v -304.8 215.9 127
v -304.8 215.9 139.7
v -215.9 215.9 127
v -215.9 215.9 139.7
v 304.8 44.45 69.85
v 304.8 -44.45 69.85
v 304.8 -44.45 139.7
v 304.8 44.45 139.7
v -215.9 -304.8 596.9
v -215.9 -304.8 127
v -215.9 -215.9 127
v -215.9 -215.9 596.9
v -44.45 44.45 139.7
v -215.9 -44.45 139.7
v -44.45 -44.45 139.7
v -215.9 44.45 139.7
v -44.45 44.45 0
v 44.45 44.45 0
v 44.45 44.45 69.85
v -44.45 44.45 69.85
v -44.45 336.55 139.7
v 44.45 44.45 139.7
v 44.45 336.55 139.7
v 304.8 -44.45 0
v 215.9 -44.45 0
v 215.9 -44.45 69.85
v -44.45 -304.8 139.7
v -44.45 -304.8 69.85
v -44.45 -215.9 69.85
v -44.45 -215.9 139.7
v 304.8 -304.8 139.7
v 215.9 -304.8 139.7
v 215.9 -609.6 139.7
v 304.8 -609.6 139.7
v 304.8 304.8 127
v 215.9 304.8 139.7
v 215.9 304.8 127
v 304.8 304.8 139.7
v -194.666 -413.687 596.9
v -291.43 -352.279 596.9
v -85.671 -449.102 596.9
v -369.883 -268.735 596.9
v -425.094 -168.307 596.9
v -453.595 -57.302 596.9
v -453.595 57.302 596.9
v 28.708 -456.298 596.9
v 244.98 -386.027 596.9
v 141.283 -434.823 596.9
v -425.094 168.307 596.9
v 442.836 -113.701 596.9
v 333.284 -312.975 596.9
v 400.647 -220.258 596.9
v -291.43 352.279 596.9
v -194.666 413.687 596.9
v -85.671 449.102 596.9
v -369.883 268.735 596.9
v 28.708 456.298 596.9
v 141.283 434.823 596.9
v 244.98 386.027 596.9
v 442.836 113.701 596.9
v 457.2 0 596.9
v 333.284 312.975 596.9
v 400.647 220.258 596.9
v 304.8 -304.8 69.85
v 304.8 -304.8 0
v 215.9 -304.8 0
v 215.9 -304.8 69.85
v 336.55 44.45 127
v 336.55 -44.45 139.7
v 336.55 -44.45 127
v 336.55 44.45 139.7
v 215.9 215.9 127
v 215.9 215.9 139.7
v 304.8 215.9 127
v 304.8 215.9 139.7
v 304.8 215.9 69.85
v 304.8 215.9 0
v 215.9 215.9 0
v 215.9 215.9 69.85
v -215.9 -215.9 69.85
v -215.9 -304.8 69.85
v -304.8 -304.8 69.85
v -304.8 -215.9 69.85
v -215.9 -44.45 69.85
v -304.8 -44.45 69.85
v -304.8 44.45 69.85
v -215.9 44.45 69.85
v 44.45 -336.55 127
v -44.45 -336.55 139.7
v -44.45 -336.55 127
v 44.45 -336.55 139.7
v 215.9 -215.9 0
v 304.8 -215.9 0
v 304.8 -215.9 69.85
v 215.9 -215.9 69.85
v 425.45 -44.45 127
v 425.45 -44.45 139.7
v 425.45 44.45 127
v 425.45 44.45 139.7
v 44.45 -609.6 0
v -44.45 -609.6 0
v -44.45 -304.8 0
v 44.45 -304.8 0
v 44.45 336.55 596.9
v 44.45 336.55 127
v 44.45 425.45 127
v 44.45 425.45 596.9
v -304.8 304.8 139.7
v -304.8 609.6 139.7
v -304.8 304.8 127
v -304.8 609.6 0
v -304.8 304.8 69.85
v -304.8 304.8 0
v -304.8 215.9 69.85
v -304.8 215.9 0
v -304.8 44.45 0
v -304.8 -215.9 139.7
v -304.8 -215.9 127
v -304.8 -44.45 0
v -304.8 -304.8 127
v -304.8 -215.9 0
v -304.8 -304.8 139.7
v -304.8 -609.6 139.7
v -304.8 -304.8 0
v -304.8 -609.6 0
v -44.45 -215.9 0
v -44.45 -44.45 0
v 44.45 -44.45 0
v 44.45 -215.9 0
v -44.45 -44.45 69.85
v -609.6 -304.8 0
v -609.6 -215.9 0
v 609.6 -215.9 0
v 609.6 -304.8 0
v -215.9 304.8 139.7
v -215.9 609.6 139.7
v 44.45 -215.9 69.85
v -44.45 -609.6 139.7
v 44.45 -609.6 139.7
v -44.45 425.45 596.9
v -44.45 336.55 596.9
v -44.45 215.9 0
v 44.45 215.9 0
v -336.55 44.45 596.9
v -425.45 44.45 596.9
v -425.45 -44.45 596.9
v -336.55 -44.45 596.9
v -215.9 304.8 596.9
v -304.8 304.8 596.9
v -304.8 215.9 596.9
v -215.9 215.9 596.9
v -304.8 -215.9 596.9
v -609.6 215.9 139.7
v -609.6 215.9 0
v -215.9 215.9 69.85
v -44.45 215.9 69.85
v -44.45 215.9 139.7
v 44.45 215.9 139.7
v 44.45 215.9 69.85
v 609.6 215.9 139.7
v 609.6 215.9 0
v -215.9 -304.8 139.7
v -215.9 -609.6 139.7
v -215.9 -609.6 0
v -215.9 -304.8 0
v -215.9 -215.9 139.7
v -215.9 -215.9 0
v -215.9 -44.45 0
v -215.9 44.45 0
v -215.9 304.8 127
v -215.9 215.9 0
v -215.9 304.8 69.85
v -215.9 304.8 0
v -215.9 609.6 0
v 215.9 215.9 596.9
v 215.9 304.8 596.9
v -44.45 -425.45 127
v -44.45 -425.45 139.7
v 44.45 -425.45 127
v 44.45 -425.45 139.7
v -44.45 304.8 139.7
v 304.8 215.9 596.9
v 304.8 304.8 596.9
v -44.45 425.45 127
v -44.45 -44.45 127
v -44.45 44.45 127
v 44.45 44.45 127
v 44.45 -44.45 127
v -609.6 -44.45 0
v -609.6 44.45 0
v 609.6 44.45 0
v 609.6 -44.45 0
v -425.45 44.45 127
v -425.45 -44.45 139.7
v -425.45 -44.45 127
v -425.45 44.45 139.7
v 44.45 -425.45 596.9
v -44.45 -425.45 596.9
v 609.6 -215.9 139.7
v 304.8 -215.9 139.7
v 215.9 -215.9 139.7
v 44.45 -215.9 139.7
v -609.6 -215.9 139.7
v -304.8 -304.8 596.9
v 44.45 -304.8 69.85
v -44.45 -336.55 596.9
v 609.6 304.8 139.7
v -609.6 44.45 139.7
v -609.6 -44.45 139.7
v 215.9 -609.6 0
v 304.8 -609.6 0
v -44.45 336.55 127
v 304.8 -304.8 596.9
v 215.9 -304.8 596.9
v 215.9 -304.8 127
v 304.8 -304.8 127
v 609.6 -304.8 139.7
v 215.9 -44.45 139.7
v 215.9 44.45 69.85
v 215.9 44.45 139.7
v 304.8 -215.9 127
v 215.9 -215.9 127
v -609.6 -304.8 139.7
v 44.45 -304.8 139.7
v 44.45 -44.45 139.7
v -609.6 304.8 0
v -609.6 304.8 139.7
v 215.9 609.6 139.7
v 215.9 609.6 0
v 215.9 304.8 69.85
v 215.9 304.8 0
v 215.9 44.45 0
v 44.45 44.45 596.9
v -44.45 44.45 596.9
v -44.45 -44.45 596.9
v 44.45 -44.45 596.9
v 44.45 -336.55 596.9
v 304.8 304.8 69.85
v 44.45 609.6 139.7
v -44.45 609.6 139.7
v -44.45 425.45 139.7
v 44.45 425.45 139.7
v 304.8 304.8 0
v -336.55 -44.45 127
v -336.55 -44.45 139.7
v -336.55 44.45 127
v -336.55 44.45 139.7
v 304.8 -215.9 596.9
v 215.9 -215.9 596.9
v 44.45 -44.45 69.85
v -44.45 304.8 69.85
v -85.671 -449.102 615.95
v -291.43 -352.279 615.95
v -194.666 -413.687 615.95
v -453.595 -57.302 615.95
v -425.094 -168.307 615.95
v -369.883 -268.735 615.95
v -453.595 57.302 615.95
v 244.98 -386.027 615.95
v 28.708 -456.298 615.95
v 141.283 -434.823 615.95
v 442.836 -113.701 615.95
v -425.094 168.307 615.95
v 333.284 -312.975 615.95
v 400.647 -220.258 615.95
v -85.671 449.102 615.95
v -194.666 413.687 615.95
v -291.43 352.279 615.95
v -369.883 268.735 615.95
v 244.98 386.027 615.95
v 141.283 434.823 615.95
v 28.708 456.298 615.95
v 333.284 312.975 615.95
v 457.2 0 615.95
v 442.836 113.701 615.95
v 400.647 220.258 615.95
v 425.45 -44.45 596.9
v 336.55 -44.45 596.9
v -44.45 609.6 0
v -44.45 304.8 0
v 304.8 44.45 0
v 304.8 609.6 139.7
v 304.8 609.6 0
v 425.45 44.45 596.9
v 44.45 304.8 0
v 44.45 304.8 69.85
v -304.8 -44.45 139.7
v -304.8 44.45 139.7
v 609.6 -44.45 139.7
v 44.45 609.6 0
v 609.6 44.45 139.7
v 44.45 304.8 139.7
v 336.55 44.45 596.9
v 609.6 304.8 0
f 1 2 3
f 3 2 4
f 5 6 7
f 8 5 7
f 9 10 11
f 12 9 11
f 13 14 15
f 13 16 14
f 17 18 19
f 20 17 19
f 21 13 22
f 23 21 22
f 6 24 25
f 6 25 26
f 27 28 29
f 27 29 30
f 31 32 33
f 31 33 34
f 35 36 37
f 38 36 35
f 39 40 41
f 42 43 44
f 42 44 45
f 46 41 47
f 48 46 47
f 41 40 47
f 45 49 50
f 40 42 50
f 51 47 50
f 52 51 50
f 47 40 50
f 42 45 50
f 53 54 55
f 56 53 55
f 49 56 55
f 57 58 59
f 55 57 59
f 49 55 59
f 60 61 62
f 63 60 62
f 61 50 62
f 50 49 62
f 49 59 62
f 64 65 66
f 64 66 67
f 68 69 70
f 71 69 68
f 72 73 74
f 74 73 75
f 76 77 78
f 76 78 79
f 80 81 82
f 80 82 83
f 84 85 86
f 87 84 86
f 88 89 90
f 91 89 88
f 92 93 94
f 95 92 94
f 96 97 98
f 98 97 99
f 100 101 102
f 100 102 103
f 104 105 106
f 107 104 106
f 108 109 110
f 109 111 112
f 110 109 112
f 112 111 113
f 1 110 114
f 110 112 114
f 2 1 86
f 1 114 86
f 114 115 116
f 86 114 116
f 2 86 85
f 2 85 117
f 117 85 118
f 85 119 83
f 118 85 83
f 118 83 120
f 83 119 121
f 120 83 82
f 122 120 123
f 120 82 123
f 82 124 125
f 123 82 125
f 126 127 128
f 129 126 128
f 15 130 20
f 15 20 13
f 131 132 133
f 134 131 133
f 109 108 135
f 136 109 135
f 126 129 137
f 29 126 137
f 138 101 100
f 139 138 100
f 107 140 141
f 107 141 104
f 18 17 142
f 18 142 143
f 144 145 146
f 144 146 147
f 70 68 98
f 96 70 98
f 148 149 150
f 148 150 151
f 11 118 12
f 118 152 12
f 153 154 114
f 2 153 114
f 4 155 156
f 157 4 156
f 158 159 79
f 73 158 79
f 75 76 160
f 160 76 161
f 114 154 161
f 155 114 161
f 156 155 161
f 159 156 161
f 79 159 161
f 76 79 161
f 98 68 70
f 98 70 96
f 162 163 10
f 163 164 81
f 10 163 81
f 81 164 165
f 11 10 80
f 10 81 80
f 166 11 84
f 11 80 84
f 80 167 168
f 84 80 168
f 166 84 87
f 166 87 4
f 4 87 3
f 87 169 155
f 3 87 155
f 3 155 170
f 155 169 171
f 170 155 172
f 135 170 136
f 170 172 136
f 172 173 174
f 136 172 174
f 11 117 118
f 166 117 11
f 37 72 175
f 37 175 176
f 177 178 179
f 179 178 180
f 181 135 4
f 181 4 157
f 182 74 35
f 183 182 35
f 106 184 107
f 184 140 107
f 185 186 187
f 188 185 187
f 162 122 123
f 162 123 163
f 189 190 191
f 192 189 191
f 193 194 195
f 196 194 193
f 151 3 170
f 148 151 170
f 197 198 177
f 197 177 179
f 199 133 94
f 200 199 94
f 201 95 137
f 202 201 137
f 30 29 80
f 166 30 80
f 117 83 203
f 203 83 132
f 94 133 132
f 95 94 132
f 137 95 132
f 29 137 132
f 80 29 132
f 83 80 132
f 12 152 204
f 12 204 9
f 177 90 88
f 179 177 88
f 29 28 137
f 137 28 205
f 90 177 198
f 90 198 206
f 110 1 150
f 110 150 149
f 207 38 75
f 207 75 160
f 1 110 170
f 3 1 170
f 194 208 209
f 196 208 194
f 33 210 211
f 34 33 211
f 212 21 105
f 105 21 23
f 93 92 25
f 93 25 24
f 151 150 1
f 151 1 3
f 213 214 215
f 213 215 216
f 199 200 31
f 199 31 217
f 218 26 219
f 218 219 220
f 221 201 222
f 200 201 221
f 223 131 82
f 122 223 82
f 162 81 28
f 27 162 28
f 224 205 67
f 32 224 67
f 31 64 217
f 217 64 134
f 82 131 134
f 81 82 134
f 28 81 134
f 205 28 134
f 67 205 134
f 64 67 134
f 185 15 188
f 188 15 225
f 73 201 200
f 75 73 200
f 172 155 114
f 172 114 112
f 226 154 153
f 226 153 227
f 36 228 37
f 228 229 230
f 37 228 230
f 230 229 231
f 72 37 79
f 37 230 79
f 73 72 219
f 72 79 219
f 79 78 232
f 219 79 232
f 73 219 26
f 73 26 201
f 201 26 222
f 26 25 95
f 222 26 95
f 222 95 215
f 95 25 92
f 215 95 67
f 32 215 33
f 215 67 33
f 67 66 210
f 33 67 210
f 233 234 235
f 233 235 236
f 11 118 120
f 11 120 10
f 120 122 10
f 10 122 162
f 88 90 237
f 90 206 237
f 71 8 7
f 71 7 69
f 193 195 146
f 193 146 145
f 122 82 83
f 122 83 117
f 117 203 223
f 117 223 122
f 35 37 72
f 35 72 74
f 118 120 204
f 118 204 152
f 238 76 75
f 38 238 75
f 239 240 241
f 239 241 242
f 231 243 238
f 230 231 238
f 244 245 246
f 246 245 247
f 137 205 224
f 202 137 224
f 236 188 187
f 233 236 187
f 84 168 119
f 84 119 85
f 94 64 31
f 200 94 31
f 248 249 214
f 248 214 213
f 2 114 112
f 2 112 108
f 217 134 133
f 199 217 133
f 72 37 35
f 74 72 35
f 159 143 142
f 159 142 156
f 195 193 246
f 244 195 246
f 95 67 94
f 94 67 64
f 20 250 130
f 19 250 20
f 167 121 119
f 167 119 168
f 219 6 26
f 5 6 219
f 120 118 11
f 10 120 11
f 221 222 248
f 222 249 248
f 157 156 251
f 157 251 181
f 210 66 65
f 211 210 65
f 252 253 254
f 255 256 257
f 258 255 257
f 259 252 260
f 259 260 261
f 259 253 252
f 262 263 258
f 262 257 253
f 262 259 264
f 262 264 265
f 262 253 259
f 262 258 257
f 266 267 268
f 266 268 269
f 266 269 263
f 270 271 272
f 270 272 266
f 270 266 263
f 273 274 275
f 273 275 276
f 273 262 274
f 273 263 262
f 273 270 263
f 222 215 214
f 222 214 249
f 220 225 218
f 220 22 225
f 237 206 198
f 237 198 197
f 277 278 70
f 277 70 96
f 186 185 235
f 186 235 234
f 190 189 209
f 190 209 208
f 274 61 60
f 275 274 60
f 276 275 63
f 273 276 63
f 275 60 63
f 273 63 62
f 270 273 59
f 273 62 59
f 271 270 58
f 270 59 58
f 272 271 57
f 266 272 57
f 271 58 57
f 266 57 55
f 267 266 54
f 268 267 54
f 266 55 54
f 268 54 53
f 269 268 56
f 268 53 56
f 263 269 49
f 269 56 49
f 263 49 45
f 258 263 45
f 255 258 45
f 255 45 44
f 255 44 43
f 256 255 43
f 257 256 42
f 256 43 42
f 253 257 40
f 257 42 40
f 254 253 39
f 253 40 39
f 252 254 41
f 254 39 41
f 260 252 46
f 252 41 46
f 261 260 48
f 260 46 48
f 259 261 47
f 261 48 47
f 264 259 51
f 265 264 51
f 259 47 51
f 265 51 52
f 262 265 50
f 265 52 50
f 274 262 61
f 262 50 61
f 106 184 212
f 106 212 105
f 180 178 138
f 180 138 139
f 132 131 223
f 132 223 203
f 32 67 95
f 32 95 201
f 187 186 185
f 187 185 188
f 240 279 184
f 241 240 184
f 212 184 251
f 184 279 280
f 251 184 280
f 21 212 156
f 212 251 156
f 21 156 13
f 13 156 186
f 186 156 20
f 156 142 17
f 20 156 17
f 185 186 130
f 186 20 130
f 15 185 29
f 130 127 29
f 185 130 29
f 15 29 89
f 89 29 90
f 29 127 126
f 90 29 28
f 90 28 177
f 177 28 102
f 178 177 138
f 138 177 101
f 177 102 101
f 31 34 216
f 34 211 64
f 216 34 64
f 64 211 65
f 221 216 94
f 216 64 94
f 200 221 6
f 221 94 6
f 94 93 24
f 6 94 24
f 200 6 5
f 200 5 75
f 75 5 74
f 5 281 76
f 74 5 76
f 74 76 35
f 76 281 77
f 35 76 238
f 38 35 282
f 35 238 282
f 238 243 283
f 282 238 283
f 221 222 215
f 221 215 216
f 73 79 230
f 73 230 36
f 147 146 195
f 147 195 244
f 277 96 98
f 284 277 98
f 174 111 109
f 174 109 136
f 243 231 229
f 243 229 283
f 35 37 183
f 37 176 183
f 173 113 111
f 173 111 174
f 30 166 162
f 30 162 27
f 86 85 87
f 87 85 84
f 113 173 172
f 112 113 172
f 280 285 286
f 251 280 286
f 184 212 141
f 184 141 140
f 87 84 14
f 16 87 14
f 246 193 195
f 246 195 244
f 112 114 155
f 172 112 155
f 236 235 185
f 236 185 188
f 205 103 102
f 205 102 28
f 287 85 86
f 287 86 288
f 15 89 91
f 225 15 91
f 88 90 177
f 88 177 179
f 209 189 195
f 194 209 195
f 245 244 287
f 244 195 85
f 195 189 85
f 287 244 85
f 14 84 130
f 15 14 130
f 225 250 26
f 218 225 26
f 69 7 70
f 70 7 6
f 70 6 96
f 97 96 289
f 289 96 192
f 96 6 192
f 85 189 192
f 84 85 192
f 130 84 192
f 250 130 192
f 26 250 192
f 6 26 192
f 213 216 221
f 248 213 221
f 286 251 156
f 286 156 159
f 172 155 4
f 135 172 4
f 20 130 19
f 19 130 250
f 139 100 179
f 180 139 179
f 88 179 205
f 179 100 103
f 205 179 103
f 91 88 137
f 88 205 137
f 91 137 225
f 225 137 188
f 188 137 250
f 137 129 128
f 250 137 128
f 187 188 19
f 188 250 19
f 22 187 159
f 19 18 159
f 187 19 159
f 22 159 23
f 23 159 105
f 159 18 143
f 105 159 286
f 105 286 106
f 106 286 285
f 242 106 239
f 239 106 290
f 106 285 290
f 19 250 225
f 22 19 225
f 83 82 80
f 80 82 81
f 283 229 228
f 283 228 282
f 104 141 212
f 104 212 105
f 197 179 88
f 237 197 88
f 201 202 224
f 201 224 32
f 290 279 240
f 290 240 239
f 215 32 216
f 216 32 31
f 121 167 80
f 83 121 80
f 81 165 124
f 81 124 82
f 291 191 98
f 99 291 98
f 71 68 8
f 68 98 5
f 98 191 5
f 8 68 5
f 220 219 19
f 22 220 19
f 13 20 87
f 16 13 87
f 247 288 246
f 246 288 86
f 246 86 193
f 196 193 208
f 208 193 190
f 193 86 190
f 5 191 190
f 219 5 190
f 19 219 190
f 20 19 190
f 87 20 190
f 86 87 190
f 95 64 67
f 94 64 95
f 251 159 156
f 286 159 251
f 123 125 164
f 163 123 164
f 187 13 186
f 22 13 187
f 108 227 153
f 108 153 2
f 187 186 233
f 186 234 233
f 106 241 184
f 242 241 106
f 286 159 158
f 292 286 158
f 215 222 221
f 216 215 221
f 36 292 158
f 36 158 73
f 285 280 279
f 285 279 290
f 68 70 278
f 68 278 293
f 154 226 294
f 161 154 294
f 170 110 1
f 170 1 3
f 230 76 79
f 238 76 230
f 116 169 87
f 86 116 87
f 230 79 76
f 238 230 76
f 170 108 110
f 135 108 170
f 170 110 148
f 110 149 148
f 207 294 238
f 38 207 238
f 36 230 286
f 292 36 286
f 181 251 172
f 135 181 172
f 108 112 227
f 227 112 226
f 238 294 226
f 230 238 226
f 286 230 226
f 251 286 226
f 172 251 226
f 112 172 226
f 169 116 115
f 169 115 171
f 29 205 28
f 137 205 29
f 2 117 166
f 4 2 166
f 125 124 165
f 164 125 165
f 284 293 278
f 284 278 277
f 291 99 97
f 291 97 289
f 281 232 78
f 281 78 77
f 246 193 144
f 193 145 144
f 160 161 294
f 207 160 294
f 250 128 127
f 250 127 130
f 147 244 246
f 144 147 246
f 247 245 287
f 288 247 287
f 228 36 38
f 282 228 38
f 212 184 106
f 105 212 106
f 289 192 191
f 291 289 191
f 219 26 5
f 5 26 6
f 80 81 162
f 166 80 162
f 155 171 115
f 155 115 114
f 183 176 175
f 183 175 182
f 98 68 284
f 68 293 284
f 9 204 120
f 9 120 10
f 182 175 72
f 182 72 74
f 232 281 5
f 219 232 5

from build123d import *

# Parameters (mm, degrees)
F0_W          = 88.9
F0_H          = 304.8
F0_H_2        = 88.9
F0_H_3        = 171.45
F1_DEPTH      = 139.7
F0_W_2        = 304.8
F0_W_3        = 171.45
F2_DEPTH      = 139.7
F3_W          = 88.9
F3_H          = 69.85
F4_DEPTH      = 914.401
F5_W          = 88.9
F5_H          = 69.85
F6_DEPTH      = 914.401
F7_W          = 88.9
F7_H          = 88.9
F8_DEPTH      = 457.2
F8_DEPTH_BACK = 12.7
F10_R         = 457.2
F10_W         = 88.9
F10_H         = 88.9
F11_DEPTH     = 19.05


# Not quite as in the source:
# - a feature names something its author has since deleted; it is built from what else it names


with BuildPart() as f1:
    # F0 (on Top) → F1 (new body)
    with BuildSketch(Plane.XY):
        with Locations((-260.35, 457.2)):
            Rectangle(F0_W, F0_H)
        with Locations((-260.35, 260.35)):
            Rectangle(F0_W, F0_H_2)
        with Locations((-260.35, 130.175)):
            Rectangle(F0_W, F0_H_3)
        with Locations((-260.35, 0)):
            Rectangle(F0_W, F0_H_2)
        with Locations((-260.35, -130.175)):
            Rectangle(F0_W, F0_H_3)
        with Locations((-260.35, -260.35)):
            Rectangle(F0_W, F0_H_2)
        with Locations((-260.35, -457.2)):
            Rectangle(F0_W, F0_H)
    extrude(amount=F1_DEPTH)


with BuildPart() as f1b:
    # F0 (on Top) → F1, piece 2 (new body)
    with BuildSketch(Plane.XY):
        with Locations((0, -457.2)):
            Rectangle(F0_W, F0_H)
        with Locations((0, -260.35)):
            Rectangle(F0_W, F0_H_2)
        with Locations((0, -130.175)):
            Rectangle(F0_W, F0_H_3)
        Rectangle(F0_W, F0_H_2)
        with Locations((0, 130.175)):
            Rectangle(F0_W, F0_H_3)
        with Locations((0, 260.35)):
            Rectangle(F0_W, F0_H_2)
        with Locations((0, 457.2)):
            Rectangle(F0_W, F0_H)
    extrude(amount=F1_DEPTH)


with BuildPart() as f1c:
    # F0 (on Top) → F1, piece 3 (new body)
    with BuildSketch(Plane.XY):
        with Locations((260.35, 457.2)):
            Rectangle(F0_W, F0_H)
        with Locations((260.35, 260.35)):
            Rectangle(F0_W, F0_H_2)
        with Locations((260.35, 130.175)):
            Rectangle(F0_W, F0_H_3)
        with Locations((260.35, 0)):
            Rectangle(F0_W, F0_H_2)
        with Locations((260.35, -130.175)):
            Rectangle(F0_W, F0_H_3)
        with Locations((260.35, -260.35)):
            Rectangle(F0_W, F0_H_2)
        with Locations((260.35, -457.2)):
            Rectangle(F0_W, F0_H)
    extrude(amount=F1_DEPTH)


with BuildPart() as f2:
    # F0 (on Top) → F2 (new body)
    with BuildSketch(Plane.XY):
        with Locations((-457.2, 260.35)):
            Rectangle(F0_W_2, F0_H_2)
        with Locations((-260.35, 260.35)):
            Rectangle(F0_W, F0_H_2)
        with Locations((-130.175, 260.35)):
            Rectangle(F0_W_3, F0_H_2)
        with Locations((0, 260.35)):
            Rectangle(F0_W, F0_H_2)
        with Locations((130.175, 260.35)):
            Rectangle(F0_W_3, F0_H_2)
        with Locations((260.35, 260.35)):
            Rectangle(F0_W, F0_H_2)
        with Locations((457.2, 260.35)):
            Rectangle(F0_W_2, F0_H_2)
    extrude(amount=F2_DEPTH)


with BuildPart() as f2b:
    # F0 (on Top) → F2, piece 2 (new body)
    with BuildSketch(Plane.XY):
        with Locations((457.2, 0)):
            Rectangle(F0_W_2, F0_H_2)
        with Locations((260.35, 0)):
            Rectangle(F0_W, F0_H_2)
        with Locations((130.175, 0)):
            Rectangle(F0_W_3, F0_H_2)
        Rectangle(F0_W, F0_H_2)
        with Locations((-130.175, 0)):
            Rectangle(F0_W_3, F0_H_2)
        with Locations((-260.35, 0)):
            Rectangle(F0_W, F0_H_2)
        with Locations((-457.2, 0)):
            Rectangle(F0_W_2, F0_H_2)
    extrude(amount=F2_DEPTH)


with BuildPart() as f2c:
    # F0 (on Top) → F2, piece 3 (new body)
    with BuildSketch(Plane.XY):
        with Locations((-457.2, -260.35)):
            Rectangle(F0_W_2, F0_H_2)
        with Locations((-260.35, -260.35)):
            Rectangle(F0_W, F0_H_2)
        with Locations((-130.175, -260.35)):
            Rectangle(F0_W_3, F0_H_2)
        with Locations((0, -260.35)):
            Rectangle(F0_W, F0_H_2)
        with Locations((130.175, -260.35)):
            Rectangle(F0_W_3, F0_H_2)
        with Locations((260.35, -260.35)):
            Rectangle(F0_W, F0_H_2)
        with Locations((457.2, -260.35)):
            Rectangle(F0_W_2, F0_H_2)
    extrude(amount=F2_DEPTH)


with BuildPart() as f4_tool:
    # F3 (on face) → F4 (new body, through all)
    with BuildSketch(Plane.XZ.offset(304.8)):
        with Locations((-260.35, 104.775)):
            Rectangle(F3_W, F3_H)
        with Locations((0, 104.775)):
            Rectangle(F3_W, F3_H)
        with Locations((260.35, 104.775)):
            Rectangle(F3_W, F3_H)
    extrude(amount=-F4_DEPTH)


with BuildPart() as f2_1:
    add(f2.part)

    # F4: cut by f4_tool
    add(f4_tool.part, mode=Mode.SUBTRACT)


with BuildPart() as f2b_1:
    add(f2b.part)

    # F4: cut by f4_tool
    add(f4_tool.part, mode=Mode.SUBTRACT)


with BuildPart() as f2c_1:
    add(f2c.part)

    # F4: cut by f4_tool
    add(f4_tool.part, mode=Mode.SUBTRACT)


with BuildPart() as f6_tool:
    # F5 (on face) → F6 (new body, through all)
    with BuildSketch(Plane.YZ.offset(304.8)):
        with Locations((-260.35, 34.925)):
            Rectangle(F5_W, F5_H)
        with Locations((0, 34.925)):
            Rectangle(F5_W, F5_H)
        with Locations((260.35, 34.925)):
            Rectangle(F5_W, F5_H)
    extrude(amount=-F6_DEPTH)


with BuildPart() as f1_1:
    add(f1.part)

    # F6: cut by f6_tool
    add(f6_tool.part, mode=Mode.SUBTRACT)


with BuildPart() as f1b_1:
    add(f1b.part)

    # F6: cut by f6_tool
    add(f6_tool.part, mode=Mode.SUBTRACT)


with BuildPart() as f1c_1:
    add(f1c.part)

    # F6: cut by f6_tool
    add(f6_tool.part, mode=Mode.SUBTRACT)


with BuildPart() as f8:
    # F7 (on face) → F8 (new body, two sides)
    with BuildSketch(Plane.XY.offset(139.7)) as f8_sk:
        with Locations((-260.35, 260.35)):
            Rectangle(F7_W, F7_H)
    extrude(amount=F8_DEPTH)
    extrude(f8_sk.sketch, amount=-F8_DEPTH_BACK)


with BuildPart() as f8b:
    # F7 (on face) → F8, piece 2 (new body, two sides)
    with BuildSketch(Plane.XY.offset(139.7)) as f8_2_sk:
        with Locations((260.35, 260.35)):
            Rectangle(F7_W, F7_H)
    extrude(amount=F8_DEPTH)
    extrude(f8_2_sk.sketch, amount=-F8_DEPTH_BACK)


with BuildPart() as f8c:
    # F7 (on face) → F8, piece 3 (new body, two sides)
    with BuildSketch(Plane.XY.offset(139.7)) as f8_3_sk:
        Rectangle(F7_W, F7_H)
    extrude(amount=F8_DEPTH)
    extrude(f8_3_sk.sketch, amount=-F8_DEPTH_BACK)


with BuildPart() as f8d:
    # F7 (on face) → F8, piece 4 (new body, two sides)
    with BuildSketch(Plane.XY.offset(139.7)) as f8_4_sk:
        with Locations((0, 381)):
            Rectangle(F7_W, F7_H)
    extrude(amount=F8_DEPTH)
    extrude(f8_4_sk.sketch, amount=-F8_DEPTH_BACK)


with BuildPart() as f8e:
    # F7 (on face) → F8, piece 5 (new body, two sides)
    with BuildSketch(Plane.XY.offset(139.7)) as f8_5_sk:
        with Locations((0, -381)):
            Rectangle(F7_W, F7_H)
    extrude(amount=F8_DEPTH)
    extrude(f8_5_sk.sketch, amount=-F8_DEPTH_BACK)


with BuildPart() as f8f:
    # F7 (on face) → F8, piece 6 (new body, two sides)
    with BuildSketch(Plane.XY.offset(139.7)) as f8_6_sk:
        with Locations((-260.35, -260.35)):
            Rectangle(F7_W, F7_H)
    extrude(amount=F8_DEPTH)
    extrude(f8_6_sk.sketch, amount=-F8_DEPTH_BACK)


with BuildPart() as f8g:
    # F7 (on face) → F8, piece 7 (new body, two sides)
    with BuildSketch(Plane.XY.offset(139.7)) as f8_7_sk:
        with Locations((260.35, -260.35)):
            Rectangle(F7_W, F7_H)
    extrude(amount=F8_DEPTH)
    extrude(f8_7_sk.sketch, amount=-F8_DEPTH_BACK)


with BuildPart() as f8h:
    # F7 (on face) → F8, piece 8 (new body, two sides)
    with BuildSketch(Plane.XY.offset(139.7)) as f8_8_sk:
        with Locations((381, 0)):
            Rectangle(F7_W, F7_H)
    extrude(amount=F8_DEPTH)
    extrude(f8_8_sk.sketch, amount=-F8_DEPTH_BACK)


with BuildPart() as f8i:
    # F7 (on face) → F8, piece 9 (new body, two sides)
    with BuildSketch(Plane.XY.offset(139.7)) as f8_9_sk:
        with Locations((-381, 0)):
            Rectangle(F7_W, F7_H)
    extrude(amount=F8_DEPTH)
    extrude(f8_9_sk.sketch, amount=-F8_DEPTH_BACK)


with BuildPart() as f1_2:
    add(f1_1.part)

    # F9: cut F8i, F8, F8d, F8b, F8h, F8c, F8g, F8e, F8f
    add(f8i.part, mode=Mode.SUBTRACT)
    add(f8.part, mode=Mode.SUBTRACT)
    add(f8d.part, mode=Mode.SUBTRACT)
    add(f8b.part, mode=Mode.SUBTRACT)
    add(f8h.part, mode=Mode.SUBTRACT)
    add(f8c.part, mode=Mode.SUBTRACT)
    add(f8g.part, mode=Mode.SUBTRACT)
    add(f8e.part, mode=Mode.SUBTRACT)
    add(f8f.part, mode=Mode.SUBTRACT)


with BuildPart() as f2b_2:
    add(f2b_1.part)

    # F9: cut F8i, F8, F8d, F8b, F8h, F8c, F8g, F8e, F8f
    add(f8i.part, mode=Mode.SUBTRACT)
    add(f8.part, mode=Mode.SUBTRACT)
    add(f8d.part, mode=Mode.SUBTRACT)
    add(f8b.part, mode=Mode.SUBTRACT)
    add(f8h.part, mode=Mode.SUBTRACT)
    add(f8c.part, mode=Mode.SUBTRACT)
    add(f8g.part, mode=Mode.SUBTRACT)
    add(f8e.part, mode=Mode.SUBTRACT)
    add(f8f.part, mode=Mode.SUBTRACT)


with BuildPart() as f2_2:
    add(f2_1.part)

    # F9: cut F8i, F8, F8d, F8b, F8h, F8c, F8g, F8e, F8f
    add(f8i.part, mode=Mode.SUBTRACT)
    add(f8.part, mode=Mode.SUBTRACT)
    add(f8d.part, mode=Mode.SUBTRACT)
    add(f8b.part, mode=Mode.SUBTRACT)
    add(f8h.part, mode=Mode.SUBTRACT)
    add(f8c.part, mode=Mode.SUBTRACT)
    add(f8g.part, mode=Mode.SUBTRACT)
    add(f8e.part, mode=Mode.SUBTRACT)
    add(f8f.part, mode=Mode.SUBTRACT)


with BuildPart() as f1c_2:
    add(f1c_1.part)

    # F9: cut F8i, F8, F8d, F8b, F8h, F8c, F8g, F8e, F8f
    add(f8i.part, mode=Mode.SUBTRACT)
    add(f8.part, mode=Mode.SUBTRACT)
    add(f8d.part, mode=Mode.SUBTRACT)
    add(f8b.part, mode=Mode.SUBTRACT)
    add(f8h.part, mode=Mode.SUBTRACT)
    add(f8c.part, mode=Mode.SUBTRACT)
    add(f8g.part, mode=Mode.SUBTRACT)
    add(f8e.part, mode=Mode.SUBTRACT)
    add(f8f.part, mode=Mode.SUBTRACT)


with BuildPart() as f1b_2:
    add(f1b_1.part)

    # F9: cut F8i, F8, F8d, F8b, F8h, F8c, F8g, F8e, F8f
    add(f8i.part, mode=Mode.SUBTRACT)
    add(f8.part, mode=Mode.SUBTRACT)
    add(f8d.part, mode=Mode.SUBTRACT)
    add(f8b.part, mode=Mode.SUBTRACT)
    add(f8h.part, mode=Mode.SUBTRACT)
    add(f8c.part, mode=Mode.SUBTRACT)
    add(f8g.part, mode=Mode.SUBTRACT)
    add(f8e.part, mode=Mode.SUBTRACT)
    add(f8f.part, mode=Mode.SUBTRACT)


with BuildPart() as f2c_2:
    add(f2c_1.part)

    # F9: cut F8i, F8, F8d, F8b, F8h, F8c, F8g, F8e, F8f
    add(f8i.part, mode=Mode.SUBTRACT)
    add(f8.part, mode=Mode.SUBTRACT)
    add(f8d.part, mode=Mode.SUBTRACT)
    add(f8b.part, mode=Mode.SUBTRACT)
    add(f8h.part, mode=Mode.SUBTRACT)
    add(f8c.part, mode=Mode.SUBTRACT)
    add(f8g.part, mode=Mode.SUBTRACT)
    add(f8e.part, mode=Mode.SUBTRACT)
    add(f8f.part, mode=Mode.SUBTRACT)


with BuildPart() as f11:
    # F10 (on face) → F11 (new body)
    with BuildSketch(Plane.XY.offset(596.9)):
        Circle(F10_R)
        Rectangle(F10_W, F10_H, mode=Mode.SUBTRACT)
        Rectangle(F10_W, F10_H)
    extrude(amount=F11_DEPTH)


solid = Compound([f8.part, f8b.part, f8c.part, f8d.part, f8e.part, f8f.part, f8g.part, f8h.part, f8i.part, f1_2.part, f2b_2.part, f2_2.part, f1c_2.part, f1b_2.part, f2c_2.part, f11.part])
